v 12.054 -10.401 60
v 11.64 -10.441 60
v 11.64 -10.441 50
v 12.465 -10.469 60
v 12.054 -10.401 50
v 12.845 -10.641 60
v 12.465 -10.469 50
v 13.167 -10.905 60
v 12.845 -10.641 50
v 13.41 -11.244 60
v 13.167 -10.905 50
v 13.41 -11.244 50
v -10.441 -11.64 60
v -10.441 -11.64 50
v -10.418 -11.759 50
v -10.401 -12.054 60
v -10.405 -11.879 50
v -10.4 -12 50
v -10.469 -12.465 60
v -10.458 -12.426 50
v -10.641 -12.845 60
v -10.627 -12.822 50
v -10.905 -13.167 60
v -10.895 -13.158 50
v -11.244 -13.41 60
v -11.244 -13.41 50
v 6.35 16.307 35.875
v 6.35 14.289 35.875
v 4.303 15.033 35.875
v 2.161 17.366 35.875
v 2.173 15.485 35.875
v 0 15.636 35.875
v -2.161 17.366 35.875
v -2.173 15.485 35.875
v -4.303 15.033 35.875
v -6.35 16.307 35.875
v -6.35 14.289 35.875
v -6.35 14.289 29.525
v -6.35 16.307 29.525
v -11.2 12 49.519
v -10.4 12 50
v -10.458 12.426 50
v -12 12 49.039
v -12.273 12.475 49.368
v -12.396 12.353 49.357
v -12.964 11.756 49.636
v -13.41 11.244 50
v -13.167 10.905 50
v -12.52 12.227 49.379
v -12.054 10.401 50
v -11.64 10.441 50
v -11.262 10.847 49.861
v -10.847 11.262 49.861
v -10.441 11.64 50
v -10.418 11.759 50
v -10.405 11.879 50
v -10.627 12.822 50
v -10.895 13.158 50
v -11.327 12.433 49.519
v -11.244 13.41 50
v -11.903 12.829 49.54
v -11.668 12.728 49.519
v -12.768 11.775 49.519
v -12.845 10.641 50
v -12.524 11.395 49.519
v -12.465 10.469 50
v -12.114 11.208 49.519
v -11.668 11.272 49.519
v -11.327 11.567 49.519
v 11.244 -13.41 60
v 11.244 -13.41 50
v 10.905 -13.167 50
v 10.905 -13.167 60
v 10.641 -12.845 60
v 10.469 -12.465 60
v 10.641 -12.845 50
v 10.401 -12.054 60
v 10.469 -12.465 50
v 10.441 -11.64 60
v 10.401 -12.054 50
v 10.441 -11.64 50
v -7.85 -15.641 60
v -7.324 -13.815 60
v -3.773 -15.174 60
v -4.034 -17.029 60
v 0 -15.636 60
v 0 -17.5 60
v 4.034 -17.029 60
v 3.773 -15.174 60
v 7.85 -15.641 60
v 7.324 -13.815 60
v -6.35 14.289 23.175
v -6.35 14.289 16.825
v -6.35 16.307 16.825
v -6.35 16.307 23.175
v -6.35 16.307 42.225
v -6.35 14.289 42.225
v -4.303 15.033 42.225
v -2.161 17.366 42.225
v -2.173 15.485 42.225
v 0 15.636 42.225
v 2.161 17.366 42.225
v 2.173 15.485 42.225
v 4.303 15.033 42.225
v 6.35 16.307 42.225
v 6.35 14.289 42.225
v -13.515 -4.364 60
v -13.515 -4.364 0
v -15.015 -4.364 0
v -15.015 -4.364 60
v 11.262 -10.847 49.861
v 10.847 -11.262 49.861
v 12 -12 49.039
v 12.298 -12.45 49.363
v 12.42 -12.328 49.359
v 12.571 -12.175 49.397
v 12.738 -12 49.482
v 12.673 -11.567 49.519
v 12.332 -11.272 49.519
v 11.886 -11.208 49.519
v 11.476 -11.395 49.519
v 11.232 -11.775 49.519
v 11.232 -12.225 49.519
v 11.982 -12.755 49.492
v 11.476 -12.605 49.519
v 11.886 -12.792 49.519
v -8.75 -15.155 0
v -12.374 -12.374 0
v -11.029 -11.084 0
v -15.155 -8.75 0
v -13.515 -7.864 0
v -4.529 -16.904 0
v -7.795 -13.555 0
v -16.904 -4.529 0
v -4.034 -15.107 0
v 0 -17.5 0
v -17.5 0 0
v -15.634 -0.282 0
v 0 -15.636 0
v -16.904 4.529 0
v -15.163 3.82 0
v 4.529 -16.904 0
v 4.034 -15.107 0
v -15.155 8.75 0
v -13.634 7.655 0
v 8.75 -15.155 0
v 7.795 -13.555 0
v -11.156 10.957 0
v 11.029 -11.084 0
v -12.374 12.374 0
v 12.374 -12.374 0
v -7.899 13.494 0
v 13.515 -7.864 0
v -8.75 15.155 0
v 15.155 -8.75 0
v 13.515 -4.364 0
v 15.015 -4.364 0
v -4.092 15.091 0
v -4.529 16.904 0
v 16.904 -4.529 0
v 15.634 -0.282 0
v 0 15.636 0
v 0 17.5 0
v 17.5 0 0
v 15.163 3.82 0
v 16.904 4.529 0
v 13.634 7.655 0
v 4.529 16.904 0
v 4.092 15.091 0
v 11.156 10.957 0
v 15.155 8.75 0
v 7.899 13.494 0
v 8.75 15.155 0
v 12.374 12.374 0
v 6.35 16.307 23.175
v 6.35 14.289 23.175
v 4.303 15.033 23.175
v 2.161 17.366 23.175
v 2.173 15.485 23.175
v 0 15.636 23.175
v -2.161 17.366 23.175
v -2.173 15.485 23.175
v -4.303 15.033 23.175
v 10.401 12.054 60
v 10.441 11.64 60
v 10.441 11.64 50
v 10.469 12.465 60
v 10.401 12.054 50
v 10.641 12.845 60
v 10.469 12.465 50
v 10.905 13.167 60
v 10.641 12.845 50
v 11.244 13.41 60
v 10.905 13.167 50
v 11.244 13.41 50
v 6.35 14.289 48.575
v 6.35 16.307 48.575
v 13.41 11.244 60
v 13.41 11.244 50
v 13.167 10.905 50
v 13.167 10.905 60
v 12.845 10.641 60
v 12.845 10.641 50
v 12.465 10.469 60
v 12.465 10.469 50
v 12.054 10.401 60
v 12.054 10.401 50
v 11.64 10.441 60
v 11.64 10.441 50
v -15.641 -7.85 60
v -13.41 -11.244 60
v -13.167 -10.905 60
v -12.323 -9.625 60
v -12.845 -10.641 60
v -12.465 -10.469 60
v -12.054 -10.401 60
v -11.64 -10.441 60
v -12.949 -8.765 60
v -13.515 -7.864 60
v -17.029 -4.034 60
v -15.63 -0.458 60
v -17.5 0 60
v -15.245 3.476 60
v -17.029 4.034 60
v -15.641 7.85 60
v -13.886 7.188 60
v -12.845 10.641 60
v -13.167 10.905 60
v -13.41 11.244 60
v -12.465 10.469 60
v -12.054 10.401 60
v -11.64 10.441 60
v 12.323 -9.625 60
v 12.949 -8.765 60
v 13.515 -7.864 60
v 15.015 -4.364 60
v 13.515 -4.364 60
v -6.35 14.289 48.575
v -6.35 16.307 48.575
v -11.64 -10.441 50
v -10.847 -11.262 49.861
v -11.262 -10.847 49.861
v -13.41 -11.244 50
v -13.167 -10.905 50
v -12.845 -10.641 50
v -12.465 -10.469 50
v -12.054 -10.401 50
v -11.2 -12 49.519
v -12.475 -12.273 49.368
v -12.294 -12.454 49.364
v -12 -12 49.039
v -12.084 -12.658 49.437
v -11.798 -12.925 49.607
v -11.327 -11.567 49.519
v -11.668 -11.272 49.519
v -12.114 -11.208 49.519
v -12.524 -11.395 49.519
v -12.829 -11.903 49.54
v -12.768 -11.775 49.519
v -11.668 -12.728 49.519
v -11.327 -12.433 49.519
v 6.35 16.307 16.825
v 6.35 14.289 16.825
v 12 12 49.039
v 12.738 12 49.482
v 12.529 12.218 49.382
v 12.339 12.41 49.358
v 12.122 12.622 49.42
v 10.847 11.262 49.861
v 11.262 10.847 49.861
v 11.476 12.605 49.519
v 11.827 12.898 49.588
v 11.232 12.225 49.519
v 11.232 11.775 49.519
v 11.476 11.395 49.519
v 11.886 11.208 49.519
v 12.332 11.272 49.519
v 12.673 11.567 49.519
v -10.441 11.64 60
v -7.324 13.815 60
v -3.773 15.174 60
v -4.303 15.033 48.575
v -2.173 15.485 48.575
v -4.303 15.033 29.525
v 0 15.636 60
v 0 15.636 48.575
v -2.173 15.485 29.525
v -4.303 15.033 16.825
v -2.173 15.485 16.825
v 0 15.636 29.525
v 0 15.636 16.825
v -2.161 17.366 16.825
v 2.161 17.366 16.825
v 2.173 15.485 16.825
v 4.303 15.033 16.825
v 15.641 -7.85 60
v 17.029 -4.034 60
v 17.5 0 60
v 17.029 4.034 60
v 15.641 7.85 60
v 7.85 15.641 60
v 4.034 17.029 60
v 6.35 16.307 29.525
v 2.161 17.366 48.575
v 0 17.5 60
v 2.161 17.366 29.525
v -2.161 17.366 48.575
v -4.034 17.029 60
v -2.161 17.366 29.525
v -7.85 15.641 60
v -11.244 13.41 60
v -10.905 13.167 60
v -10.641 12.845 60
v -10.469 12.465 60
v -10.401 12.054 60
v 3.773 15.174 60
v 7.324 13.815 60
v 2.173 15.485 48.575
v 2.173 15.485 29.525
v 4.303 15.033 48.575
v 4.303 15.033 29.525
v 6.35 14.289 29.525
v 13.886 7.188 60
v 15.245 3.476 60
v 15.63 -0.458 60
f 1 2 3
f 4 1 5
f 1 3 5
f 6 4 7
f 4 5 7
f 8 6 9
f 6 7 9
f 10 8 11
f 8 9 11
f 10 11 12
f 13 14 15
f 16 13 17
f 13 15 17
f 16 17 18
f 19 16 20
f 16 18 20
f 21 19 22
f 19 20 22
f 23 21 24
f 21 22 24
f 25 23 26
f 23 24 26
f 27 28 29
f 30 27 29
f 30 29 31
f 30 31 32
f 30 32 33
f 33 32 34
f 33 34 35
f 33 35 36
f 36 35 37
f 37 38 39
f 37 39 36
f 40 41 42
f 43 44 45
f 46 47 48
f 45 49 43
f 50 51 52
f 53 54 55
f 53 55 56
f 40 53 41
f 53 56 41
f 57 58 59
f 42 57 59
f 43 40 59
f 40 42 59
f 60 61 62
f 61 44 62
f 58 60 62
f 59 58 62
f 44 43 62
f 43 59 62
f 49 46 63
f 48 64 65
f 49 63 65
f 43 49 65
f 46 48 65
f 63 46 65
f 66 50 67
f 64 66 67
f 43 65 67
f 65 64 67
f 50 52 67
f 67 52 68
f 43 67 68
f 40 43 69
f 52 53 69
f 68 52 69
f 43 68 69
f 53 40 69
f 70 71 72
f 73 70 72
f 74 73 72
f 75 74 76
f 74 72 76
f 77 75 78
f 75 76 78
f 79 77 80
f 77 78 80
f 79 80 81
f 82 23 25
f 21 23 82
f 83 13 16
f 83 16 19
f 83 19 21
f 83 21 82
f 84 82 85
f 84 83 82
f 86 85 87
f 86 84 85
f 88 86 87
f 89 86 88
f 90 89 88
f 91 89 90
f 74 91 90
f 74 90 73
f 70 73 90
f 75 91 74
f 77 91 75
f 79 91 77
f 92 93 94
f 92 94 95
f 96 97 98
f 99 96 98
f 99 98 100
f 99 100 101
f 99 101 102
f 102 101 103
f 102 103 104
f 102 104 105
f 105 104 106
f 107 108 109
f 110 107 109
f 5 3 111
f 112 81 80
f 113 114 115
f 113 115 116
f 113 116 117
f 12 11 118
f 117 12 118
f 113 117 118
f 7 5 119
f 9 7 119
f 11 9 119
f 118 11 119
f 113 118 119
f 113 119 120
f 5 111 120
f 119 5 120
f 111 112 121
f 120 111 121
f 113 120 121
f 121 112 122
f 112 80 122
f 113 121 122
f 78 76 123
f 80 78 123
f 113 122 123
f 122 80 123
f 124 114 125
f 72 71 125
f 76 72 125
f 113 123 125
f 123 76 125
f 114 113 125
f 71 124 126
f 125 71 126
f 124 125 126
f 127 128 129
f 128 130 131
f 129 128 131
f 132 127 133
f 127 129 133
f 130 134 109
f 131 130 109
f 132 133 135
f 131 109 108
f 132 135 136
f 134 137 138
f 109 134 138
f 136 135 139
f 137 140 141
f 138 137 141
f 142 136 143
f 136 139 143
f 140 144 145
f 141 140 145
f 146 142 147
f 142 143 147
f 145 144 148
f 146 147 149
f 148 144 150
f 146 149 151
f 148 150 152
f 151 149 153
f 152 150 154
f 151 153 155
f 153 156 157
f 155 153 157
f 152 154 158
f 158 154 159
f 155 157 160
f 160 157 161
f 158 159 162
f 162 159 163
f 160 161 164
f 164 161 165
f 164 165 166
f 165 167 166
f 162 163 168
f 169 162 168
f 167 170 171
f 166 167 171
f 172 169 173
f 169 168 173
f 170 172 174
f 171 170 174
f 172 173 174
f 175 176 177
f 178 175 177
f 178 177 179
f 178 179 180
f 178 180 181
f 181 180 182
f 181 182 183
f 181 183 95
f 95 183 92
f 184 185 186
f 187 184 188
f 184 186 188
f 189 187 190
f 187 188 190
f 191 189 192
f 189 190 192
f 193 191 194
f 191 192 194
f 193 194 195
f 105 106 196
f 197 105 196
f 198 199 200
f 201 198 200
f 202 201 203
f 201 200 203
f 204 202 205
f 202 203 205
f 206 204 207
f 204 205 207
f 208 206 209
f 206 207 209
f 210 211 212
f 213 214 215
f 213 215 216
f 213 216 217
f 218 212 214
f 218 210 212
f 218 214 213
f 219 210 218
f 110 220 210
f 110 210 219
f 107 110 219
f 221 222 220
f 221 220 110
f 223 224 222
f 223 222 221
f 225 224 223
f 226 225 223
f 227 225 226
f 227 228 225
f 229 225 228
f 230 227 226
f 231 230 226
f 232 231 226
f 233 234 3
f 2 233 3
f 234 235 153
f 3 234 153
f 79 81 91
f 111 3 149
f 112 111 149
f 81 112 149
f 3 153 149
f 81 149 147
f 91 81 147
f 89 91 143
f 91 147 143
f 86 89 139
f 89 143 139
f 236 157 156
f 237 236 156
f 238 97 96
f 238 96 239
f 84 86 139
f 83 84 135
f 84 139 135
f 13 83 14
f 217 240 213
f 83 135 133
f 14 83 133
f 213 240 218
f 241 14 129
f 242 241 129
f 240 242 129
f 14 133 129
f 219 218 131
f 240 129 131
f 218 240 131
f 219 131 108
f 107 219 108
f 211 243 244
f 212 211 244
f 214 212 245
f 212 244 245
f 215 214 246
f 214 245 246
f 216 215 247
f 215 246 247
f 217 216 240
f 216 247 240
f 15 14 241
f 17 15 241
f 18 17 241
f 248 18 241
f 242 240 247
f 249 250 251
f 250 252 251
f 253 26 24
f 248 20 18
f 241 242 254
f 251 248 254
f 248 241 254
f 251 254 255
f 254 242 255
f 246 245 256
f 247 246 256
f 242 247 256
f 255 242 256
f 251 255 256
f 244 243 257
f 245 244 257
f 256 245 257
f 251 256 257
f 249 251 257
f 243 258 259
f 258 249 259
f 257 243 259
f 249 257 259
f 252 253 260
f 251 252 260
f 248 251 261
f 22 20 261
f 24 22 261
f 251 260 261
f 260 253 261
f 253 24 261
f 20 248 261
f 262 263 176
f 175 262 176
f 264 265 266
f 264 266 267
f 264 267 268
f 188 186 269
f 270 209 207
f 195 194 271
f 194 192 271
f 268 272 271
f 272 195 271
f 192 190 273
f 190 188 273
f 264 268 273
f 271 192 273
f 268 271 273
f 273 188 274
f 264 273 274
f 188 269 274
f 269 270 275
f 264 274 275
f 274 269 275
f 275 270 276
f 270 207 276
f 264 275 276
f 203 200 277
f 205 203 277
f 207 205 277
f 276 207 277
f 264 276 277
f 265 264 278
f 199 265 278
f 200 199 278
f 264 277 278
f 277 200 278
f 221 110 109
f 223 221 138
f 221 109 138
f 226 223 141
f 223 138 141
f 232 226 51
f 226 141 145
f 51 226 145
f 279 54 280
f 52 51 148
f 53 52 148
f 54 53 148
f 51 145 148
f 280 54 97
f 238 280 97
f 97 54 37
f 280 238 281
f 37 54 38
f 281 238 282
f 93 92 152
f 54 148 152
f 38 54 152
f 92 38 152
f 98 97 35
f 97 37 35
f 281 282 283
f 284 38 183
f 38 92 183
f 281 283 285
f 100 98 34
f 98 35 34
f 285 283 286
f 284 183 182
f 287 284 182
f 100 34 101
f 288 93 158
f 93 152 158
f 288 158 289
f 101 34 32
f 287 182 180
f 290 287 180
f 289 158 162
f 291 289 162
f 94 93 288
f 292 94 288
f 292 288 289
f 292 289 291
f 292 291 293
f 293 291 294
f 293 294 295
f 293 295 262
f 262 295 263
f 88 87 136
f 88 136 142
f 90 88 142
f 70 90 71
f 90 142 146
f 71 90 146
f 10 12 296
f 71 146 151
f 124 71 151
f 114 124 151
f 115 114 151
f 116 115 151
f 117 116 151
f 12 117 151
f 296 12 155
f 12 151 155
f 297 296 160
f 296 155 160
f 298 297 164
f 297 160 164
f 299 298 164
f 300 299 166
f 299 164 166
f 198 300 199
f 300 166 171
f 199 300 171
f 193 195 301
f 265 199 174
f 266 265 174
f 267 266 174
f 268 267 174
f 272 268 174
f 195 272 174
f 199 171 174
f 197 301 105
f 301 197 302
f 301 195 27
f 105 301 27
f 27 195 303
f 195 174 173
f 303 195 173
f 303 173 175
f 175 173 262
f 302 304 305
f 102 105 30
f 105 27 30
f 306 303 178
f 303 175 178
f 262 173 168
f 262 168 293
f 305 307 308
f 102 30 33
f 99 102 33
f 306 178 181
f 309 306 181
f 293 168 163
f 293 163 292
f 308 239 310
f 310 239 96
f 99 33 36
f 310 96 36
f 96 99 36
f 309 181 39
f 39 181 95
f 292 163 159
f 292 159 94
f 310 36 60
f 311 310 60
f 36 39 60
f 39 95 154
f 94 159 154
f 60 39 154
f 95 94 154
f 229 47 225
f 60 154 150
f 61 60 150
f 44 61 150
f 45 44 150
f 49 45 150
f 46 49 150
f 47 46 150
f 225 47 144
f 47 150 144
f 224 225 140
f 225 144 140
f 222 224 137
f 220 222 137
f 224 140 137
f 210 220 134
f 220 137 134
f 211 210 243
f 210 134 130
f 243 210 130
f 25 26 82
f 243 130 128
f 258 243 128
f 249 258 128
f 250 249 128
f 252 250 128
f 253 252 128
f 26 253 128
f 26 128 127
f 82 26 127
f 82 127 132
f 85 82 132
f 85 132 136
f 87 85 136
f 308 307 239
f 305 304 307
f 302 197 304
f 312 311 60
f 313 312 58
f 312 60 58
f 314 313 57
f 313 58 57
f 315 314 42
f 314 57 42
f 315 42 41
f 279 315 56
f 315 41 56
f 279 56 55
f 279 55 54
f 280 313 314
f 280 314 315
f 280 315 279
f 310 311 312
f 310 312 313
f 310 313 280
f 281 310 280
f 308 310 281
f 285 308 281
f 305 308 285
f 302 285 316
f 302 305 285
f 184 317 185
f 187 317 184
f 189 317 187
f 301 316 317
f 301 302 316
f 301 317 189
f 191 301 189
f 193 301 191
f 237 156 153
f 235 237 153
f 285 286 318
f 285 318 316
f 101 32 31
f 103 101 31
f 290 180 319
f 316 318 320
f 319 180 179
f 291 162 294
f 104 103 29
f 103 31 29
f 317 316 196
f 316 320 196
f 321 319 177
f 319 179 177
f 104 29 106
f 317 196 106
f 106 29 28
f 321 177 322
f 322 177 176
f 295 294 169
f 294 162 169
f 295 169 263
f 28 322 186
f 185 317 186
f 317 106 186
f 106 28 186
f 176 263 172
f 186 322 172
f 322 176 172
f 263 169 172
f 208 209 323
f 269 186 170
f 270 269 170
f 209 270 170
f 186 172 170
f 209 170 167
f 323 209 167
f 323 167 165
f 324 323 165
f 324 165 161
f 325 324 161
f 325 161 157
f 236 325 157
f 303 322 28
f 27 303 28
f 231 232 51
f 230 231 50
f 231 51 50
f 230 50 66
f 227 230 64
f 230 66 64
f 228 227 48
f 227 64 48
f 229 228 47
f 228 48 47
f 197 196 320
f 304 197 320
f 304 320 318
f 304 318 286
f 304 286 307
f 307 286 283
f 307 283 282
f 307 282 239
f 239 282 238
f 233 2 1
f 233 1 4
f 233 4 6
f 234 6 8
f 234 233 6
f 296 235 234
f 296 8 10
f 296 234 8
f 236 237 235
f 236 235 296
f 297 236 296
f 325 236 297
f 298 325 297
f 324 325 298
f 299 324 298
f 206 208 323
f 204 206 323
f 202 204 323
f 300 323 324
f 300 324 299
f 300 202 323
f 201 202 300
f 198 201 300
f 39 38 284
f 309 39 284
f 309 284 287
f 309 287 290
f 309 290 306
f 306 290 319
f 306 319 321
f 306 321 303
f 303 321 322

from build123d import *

# Parameters (mm, degrees)
F1_DEPTH = 60
F2_DEPTH = 60
F4_D     = 3.2
F4_DEPTH = 10
F4_TIP   = 0.9613769904
F5_W     = 6.35
F5_H     = 6.35
F6_DEPTH = 25


with BuildPart() as f1:
    # F0 (on Top) → F1 (new body)
    with BuildSketch(Plane.XY):
        with BuildLine():
            ThreePointArc((-15.0151466486, -4.363634278), (-12.5045454624, 9.3878791946), (0, 15.636365722))
            Line((0, 15.636365722), (0, 17.5))
            ThreePointArc((0, 17.5), (-17.5, 0), (0, -17.5))
            Line((0, -17.5), (0, -15.636365722))
            ThreePointArc((0, -15.636365722), (-7.7954240269, -13.5546042817), (-13.5151466486, -7.863634278))
            ThreePointArc((-13.5151466486, -7.863634278), (-14.3720878409, -6.1594662175), (-15.0151466486, -4.363634278))
        make_face()
        with BuildLine():
            Line((0, 17.5), (0, 15.636365722))
            ThreePointArc((0, 15.636365722), (12.5045454624, 9.3878791946), (15.0151466486, -4.363634278))
            ThreePointArc((15.0151466486, -4.363634278), (14.3720878409, -6.1594662175), (13.5151466486, -7.863634278))
            ThreePointArc((13.5151466486, -7.863634278), (7.7954240269, -13.5546042817), (0, -15.636365722))
            Line((0, -15.636365722), (0, -17.5))
            ThreePointArc((0, -17.5), (17.5, 0), (0, 17.5))
        make_face()
    extrude(amount=F1_DEPTH)

    # F0 (on Top) → F2 (join)
    with BuildSketch(Plane.XY):
        with BuildLine():
            Line((-13.5151466486, -4.363634278), (-15.0151466486, -4.363634278))
            ThreePointArc((-15.0151466486, -4.363634278), (-14.3720878409, -6.1594662175), (-13.5151466486, -7.863634278))
            Line((-13.5151466486, -7.863634278), (-13.5151466486, -4.363634278))
        make_face()
        with BuildLine():
            ThreePointArc((13.5151466486, -7.863634278), (14.3720878409, -6.1594662175), (15.0151466486, -4.363634278))
            Line((15.0151466486, -4.363634278), (13.5151466486, -4.363634278))
            Line((13.5151466486, -4.363634278), (13.5151466486, -7.863634278))
        make_face()
    extrude(amount=F2_DEPTH)

    # F4
    with Locations(Plane.XY.offset(60)):
        with Locations((12, 12), (-12, 12), (-12, -12), (12, -12)):
            Hole(F4_D / 2, depth=F4_DEPTH)
            with Locations((0, 0, -(F4_DEPTH + F4_TIP / 2))):  # 118° drill point
                Cone(0, F4_D / 2, F4_TIP, mode=Mode.SUBTRACT)

    # F5 (on Front) → F6 (cut)
    with BuildSketch(Plane.XZ):
        with Locations((-3.175, 20)):
            Rectangle(F5_W, F5_H)
        with Locations((3.175, 20)):
            Rectangle(F5_W, F5_H)
        with Locations((-3.175, 45.4)):
            Rectangle(F5_W, F5_H)
        with Locations((3.175, 45.4)):
            Rectangle(F5_W, F5_H)
        with Locations((-3.175, 32.7)):
            Rectangle(F5_W, F5_H)
        with Locations((3.175, 32.7)):
            Rectangle(F5_W, F5_H)
    extrude(amount=-F6_DEPTH, mode=Mode.SUBTRACT)


solid = f1.part
